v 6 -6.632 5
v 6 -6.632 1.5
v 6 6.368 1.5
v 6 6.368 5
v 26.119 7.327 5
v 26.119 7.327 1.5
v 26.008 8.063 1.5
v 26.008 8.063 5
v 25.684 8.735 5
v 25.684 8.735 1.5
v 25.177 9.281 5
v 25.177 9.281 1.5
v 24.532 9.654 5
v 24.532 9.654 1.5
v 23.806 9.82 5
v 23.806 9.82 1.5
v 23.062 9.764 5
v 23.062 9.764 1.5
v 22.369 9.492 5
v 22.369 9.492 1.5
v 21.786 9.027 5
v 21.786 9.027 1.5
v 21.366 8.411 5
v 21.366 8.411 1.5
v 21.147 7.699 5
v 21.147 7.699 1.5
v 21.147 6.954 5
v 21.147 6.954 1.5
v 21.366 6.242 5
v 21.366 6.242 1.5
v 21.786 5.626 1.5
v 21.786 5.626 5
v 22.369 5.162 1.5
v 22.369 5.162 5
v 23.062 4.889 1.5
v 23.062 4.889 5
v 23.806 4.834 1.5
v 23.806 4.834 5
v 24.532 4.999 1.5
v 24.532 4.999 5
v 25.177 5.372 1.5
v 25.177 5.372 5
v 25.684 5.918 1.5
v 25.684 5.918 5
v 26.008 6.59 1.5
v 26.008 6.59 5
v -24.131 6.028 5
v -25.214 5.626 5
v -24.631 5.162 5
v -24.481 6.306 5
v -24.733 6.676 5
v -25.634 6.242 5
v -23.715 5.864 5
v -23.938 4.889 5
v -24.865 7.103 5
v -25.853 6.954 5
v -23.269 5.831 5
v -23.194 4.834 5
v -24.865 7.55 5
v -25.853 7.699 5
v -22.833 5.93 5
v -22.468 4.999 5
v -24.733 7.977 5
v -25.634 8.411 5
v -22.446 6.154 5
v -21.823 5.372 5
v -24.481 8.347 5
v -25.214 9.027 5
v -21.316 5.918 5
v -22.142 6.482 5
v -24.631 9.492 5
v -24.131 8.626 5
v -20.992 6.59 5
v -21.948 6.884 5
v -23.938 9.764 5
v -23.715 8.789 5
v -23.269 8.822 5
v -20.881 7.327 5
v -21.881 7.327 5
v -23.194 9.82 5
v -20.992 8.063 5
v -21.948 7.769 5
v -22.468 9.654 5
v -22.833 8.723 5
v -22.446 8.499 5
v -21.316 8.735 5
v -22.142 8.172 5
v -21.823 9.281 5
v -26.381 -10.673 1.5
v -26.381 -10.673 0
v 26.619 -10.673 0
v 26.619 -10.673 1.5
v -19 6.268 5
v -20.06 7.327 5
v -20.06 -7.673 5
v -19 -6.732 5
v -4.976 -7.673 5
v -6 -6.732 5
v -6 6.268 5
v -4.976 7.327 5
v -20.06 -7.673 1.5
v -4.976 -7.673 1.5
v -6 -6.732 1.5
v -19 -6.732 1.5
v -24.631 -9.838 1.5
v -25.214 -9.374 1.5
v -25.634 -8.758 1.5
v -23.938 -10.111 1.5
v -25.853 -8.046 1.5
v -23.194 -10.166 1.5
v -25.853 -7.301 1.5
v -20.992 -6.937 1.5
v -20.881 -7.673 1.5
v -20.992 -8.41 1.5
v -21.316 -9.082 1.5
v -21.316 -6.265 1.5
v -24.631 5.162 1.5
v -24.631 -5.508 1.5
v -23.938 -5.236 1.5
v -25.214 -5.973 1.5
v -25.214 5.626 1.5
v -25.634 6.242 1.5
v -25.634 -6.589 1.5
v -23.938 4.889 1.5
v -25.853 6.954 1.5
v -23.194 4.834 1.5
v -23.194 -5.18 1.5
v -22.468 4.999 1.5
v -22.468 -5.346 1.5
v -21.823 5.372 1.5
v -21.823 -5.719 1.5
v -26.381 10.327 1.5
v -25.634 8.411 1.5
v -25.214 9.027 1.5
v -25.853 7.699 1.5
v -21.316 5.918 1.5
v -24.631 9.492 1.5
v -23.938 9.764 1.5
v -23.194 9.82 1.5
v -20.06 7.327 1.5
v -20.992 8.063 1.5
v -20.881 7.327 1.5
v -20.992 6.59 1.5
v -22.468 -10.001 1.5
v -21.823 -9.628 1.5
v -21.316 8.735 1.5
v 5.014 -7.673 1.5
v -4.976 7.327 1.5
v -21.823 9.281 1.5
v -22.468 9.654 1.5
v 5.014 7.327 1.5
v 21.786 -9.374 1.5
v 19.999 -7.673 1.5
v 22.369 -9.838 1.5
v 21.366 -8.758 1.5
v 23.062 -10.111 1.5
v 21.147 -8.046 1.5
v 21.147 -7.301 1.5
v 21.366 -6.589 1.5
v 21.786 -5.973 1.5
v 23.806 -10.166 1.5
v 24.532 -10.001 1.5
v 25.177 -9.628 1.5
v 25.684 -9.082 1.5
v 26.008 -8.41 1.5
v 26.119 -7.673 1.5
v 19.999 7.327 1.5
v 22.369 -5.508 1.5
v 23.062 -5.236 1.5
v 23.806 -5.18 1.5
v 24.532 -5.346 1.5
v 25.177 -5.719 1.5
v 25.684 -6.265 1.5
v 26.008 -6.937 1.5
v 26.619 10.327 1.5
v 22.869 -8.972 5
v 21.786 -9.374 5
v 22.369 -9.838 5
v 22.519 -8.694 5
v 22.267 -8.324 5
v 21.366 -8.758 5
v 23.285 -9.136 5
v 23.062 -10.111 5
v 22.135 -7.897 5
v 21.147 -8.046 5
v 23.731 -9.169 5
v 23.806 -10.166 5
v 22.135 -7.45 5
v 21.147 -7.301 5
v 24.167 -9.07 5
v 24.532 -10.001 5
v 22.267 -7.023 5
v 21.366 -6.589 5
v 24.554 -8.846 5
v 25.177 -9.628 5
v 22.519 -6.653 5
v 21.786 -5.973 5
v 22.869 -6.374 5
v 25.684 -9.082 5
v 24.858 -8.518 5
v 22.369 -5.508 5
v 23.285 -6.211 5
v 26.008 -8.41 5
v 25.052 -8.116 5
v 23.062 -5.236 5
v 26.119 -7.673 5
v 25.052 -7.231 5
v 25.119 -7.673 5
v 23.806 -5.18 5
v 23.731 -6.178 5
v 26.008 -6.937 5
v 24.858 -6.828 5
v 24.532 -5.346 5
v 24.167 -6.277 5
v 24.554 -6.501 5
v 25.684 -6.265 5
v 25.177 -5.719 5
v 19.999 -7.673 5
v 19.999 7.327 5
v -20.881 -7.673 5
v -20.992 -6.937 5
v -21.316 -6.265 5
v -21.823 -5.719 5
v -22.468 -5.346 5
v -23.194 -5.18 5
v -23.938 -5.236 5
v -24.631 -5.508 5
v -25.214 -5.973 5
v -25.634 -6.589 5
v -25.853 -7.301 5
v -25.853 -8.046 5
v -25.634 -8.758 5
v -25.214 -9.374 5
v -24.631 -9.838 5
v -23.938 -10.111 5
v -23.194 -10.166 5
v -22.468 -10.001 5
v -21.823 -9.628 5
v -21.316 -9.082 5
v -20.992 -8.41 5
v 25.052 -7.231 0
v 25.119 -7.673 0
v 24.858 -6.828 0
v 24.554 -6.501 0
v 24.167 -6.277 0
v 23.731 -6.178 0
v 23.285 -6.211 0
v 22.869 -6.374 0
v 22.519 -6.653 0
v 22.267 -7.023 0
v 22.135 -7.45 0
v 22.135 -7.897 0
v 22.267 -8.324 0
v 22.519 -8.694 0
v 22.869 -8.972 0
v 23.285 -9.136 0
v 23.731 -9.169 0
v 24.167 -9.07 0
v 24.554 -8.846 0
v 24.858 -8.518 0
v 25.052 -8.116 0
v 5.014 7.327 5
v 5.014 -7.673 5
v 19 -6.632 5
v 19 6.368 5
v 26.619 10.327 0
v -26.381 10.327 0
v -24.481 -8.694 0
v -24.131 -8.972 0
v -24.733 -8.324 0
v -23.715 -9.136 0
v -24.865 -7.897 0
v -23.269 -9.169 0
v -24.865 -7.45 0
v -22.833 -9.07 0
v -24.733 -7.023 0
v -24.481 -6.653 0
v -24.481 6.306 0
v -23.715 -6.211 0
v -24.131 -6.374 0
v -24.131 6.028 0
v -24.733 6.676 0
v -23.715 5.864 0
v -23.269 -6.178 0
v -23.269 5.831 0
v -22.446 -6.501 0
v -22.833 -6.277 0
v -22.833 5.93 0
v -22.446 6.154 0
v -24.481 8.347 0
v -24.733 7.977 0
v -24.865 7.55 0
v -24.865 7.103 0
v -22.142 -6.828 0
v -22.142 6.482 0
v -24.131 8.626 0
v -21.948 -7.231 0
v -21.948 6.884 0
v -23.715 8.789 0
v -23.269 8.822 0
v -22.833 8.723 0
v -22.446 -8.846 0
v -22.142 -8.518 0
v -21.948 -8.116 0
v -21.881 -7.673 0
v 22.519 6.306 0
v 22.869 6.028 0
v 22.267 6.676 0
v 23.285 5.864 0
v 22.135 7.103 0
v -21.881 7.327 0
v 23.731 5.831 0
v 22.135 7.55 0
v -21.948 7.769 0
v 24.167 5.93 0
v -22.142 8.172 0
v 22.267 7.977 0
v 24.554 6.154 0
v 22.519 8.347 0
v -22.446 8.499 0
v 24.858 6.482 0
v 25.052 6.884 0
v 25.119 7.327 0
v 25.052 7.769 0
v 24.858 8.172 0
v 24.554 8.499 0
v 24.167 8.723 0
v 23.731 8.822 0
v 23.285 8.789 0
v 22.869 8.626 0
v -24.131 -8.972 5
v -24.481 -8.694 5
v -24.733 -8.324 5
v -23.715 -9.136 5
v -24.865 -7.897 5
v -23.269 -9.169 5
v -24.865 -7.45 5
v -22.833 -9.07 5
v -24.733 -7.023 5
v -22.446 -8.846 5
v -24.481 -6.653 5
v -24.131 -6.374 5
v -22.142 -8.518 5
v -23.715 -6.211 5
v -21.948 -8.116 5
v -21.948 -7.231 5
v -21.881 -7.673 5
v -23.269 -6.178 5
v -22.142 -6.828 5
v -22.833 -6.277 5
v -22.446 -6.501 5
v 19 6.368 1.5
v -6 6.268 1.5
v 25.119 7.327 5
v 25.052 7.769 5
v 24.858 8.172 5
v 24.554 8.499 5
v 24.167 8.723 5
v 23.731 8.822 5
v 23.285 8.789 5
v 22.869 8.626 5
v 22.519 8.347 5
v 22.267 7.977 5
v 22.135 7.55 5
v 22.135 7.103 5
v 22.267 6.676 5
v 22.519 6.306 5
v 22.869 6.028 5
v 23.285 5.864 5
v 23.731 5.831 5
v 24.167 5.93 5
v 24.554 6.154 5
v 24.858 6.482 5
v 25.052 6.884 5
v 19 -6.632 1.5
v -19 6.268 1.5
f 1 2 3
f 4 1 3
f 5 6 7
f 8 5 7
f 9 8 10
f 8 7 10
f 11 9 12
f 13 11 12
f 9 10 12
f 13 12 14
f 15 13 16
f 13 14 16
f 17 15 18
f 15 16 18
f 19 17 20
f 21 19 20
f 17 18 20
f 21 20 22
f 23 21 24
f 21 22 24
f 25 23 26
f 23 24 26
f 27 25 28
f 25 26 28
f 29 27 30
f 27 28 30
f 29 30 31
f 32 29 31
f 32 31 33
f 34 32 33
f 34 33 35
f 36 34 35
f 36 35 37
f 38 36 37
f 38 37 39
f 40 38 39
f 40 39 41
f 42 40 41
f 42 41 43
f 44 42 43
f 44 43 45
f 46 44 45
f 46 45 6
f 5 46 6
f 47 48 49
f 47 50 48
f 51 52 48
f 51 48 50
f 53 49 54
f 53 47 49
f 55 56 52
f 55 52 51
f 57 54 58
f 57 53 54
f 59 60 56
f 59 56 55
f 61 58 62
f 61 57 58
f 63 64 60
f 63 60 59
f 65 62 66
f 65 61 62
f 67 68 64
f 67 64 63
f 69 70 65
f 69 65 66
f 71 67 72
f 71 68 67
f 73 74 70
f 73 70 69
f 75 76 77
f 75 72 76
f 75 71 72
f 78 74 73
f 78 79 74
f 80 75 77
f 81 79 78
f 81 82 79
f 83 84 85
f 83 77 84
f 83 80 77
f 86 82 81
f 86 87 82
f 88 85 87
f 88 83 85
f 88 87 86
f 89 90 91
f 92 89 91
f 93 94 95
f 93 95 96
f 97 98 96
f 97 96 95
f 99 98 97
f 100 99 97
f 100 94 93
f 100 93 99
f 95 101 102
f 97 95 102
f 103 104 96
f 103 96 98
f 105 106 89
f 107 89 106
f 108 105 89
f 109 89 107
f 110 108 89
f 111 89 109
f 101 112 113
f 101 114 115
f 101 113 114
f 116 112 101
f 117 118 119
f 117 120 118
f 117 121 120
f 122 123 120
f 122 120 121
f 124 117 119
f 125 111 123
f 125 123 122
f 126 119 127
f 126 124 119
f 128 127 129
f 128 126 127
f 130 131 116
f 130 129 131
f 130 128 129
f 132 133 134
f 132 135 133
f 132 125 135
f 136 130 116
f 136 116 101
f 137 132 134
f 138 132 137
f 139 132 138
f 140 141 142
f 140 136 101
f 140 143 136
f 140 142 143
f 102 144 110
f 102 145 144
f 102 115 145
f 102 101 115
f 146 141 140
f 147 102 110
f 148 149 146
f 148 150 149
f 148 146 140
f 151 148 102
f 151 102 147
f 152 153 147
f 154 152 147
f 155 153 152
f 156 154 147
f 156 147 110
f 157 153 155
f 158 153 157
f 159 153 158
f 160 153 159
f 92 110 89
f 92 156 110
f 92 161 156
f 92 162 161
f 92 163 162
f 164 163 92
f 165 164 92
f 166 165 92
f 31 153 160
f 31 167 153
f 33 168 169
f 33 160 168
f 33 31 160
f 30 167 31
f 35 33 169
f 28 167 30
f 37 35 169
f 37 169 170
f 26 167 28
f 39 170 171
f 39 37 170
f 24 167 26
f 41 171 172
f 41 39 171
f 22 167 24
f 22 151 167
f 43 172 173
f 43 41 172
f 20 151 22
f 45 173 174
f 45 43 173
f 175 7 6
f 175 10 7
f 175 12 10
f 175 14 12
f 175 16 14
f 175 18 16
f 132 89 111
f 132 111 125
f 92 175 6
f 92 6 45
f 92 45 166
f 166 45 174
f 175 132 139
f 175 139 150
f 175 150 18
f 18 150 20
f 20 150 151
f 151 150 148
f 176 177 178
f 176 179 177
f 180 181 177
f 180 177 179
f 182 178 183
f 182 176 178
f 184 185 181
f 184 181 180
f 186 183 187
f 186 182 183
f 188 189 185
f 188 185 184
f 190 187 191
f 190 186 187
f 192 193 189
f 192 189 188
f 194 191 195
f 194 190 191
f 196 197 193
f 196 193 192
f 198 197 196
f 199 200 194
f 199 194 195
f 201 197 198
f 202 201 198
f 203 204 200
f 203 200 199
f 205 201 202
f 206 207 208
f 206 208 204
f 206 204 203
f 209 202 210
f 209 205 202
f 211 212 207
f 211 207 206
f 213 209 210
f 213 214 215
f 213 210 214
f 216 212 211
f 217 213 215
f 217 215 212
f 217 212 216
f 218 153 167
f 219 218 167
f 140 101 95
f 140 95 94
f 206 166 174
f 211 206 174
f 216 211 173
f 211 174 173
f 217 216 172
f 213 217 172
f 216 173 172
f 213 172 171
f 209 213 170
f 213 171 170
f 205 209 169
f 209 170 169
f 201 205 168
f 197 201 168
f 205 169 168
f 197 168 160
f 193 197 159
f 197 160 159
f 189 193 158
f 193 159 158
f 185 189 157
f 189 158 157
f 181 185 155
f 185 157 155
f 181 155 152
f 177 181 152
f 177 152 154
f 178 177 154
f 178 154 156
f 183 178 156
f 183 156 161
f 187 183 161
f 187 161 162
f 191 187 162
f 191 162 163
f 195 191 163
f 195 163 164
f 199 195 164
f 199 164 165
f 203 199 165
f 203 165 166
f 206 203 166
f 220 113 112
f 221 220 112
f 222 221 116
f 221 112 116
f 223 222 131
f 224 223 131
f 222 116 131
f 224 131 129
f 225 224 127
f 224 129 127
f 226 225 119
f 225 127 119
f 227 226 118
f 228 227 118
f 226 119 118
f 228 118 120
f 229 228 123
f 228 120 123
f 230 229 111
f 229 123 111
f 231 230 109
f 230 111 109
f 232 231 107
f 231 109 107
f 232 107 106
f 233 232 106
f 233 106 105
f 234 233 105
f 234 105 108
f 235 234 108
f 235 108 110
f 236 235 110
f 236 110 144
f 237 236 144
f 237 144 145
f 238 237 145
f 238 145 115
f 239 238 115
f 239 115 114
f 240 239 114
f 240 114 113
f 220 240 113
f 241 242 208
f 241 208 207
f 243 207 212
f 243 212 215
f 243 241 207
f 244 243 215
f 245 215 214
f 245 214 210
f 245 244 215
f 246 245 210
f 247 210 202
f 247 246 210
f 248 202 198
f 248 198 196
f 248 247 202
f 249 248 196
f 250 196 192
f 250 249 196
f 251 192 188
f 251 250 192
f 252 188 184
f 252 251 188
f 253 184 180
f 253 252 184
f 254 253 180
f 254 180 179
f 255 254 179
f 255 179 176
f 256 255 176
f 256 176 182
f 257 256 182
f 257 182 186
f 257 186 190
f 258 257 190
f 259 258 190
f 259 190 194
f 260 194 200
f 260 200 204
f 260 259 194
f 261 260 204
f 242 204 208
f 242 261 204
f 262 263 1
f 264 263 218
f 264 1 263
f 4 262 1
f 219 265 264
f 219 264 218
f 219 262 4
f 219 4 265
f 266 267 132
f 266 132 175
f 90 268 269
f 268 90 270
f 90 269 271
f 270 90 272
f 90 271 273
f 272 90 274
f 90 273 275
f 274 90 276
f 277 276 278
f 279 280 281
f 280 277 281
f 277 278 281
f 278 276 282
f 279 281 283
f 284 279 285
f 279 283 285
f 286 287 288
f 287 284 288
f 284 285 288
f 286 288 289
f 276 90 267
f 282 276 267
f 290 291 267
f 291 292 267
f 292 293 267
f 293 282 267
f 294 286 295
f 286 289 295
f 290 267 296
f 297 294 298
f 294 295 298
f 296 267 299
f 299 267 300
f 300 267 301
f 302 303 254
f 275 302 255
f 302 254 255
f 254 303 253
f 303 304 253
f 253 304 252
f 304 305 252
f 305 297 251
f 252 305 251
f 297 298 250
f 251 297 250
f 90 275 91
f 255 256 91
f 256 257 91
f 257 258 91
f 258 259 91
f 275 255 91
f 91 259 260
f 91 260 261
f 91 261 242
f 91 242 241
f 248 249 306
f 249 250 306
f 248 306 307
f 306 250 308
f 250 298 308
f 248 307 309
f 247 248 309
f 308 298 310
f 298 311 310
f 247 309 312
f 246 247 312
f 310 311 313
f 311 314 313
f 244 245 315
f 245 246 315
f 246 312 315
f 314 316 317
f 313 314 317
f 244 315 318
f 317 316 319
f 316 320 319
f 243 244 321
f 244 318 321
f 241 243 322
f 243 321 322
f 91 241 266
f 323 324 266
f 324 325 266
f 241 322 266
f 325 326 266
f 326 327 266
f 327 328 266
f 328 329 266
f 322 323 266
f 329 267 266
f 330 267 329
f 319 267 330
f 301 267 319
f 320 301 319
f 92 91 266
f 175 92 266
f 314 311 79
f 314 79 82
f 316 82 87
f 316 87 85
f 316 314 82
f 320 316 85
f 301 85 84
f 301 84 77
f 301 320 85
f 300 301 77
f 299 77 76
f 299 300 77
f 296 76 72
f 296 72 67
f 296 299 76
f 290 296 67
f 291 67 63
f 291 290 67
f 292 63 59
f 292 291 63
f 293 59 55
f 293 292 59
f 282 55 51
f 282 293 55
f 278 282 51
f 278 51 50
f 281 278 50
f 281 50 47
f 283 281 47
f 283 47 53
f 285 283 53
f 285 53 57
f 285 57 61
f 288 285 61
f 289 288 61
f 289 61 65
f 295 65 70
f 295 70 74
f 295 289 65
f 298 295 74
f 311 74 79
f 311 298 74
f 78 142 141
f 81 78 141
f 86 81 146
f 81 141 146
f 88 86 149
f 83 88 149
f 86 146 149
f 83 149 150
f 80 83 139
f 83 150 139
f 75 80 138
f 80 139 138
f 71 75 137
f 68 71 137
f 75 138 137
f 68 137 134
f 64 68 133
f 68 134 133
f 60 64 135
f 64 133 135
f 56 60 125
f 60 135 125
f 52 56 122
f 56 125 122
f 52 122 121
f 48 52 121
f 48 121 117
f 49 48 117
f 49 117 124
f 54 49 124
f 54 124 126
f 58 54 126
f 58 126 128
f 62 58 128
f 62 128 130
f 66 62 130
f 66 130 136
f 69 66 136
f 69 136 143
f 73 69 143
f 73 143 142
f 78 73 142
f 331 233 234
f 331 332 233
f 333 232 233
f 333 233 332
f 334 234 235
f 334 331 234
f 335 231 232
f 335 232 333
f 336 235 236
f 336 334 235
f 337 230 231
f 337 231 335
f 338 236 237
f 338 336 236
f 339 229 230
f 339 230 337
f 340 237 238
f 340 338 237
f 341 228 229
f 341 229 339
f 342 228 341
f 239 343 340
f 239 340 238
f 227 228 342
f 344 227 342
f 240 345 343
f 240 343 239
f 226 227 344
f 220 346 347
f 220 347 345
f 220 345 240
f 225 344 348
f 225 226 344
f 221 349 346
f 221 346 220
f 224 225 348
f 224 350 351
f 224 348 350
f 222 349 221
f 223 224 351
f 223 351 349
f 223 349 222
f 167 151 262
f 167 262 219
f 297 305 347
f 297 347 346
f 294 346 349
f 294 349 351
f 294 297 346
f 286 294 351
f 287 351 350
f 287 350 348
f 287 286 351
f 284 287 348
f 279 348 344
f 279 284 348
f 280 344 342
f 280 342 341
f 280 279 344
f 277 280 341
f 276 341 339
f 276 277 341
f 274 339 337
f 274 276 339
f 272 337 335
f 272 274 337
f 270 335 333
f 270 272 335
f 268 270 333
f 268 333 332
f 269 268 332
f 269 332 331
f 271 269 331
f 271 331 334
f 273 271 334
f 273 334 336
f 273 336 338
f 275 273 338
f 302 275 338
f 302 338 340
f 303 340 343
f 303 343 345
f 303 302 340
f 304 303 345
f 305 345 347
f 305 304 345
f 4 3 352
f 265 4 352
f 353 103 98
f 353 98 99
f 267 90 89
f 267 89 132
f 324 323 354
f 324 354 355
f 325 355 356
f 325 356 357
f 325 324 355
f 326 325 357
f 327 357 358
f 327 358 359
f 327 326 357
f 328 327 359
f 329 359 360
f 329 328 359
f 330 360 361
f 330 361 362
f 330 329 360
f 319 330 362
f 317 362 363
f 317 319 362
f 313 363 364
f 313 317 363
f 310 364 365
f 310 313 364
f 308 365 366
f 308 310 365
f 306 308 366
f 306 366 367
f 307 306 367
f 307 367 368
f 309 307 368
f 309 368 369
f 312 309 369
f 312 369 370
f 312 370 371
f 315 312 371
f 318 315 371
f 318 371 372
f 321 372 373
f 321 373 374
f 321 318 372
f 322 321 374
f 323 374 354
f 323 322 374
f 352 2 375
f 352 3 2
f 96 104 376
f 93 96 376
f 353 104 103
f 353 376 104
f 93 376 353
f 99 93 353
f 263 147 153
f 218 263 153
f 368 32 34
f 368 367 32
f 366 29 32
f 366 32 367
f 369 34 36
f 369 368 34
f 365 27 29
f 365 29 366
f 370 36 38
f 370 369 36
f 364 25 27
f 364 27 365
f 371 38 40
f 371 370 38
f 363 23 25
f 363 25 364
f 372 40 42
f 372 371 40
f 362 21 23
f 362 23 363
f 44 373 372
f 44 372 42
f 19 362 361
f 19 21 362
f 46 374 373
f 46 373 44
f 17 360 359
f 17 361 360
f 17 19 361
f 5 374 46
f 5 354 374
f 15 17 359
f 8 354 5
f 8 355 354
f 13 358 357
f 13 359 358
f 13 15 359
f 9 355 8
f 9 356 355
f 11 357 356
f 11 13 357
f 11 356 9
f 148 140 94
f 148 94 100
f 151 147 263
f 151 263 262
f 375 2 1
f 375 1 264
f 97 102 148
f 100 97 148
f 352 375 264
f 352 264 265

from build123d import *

# Parameters (mm, degrees)
F0_W     = 53
F0_H     = 21
F0_R     = 2.5
F0_W_2   = 15.084836
F0_H_2   = 15
F0_W_3   = 14.984938
F0_W_4   = 13
F0_H_3   = 13
F1_DEPTH = 1.5
F2_DEPTH = 5
F0_R_2   = 1.5
F3_DEPTH = 5


with BuildPart() as f1:
    # F0 (on Top) → F1 (new body)
    with BuildSketch(Plane.XY):
        with Locations((0.118736, -0.1734)):
            Rectangle(F0_W, F0_H)
        with Locations((-23.381264, -7.6734)):
            Circle(F0_R, mode=Mode.SUBTRACT)
        with Locations((-12.518017, -0.1734)):
            Rectangle(F0_W_2, F0_H_2, mode=Mode.SUBTRACT)
        with Locations((23.618736, -7.6734)):
            Circle(F0_R, mode=Mode.SUBTRACT)
        with Locations((12.506826, -0.1734)):
            Rectangle(F0_W_3, F0_H_2, mode=Mode.SUBTRACT)
        with Locations((-23.381264, 7.3266)):
            Circle(F0_R, mode=Mode.SUBTRACT)
        with Locations((23.618736, 7.3266)):
            Circle(F0_R, mode=Mode.SUBTRACT)
        with Locations((-12.518017, -0.1734)):
            Rectangle(F0_W_2, F0_H_2)
        with Locations((-12.5, -0.232354)):
            Rectangle(F0_W_4, F0_H_3, mode=Mode.SUBTRACT)
        with Locations((-12.5, -0.232354)):
            Rectangle(F0_W_4, F0_H_3)
        with Locations((12.506826, -0.1734)):
            Rectangle(F0_W_3, F0_H_2)
        with Locations((12.5, -0.132455)):
            Rectangle(F0_W_4, F0_H_3, mode=Mode.SUBTRACT)
        with Locations((12.5, -0.132455)):
            Rectangle(F0_W_4, F0_H_3)
    extrude(amount=F1_DEPTH)

    # F0 (on Top) → F2 (join)
    with BuildSketch(Plane.XY):
        with Locations((-12.518017, -0.1734)):
            Rectangle(F0_W_2, F0_H_2)
        with Locations((-12.5, -0.232354)):
            Rectangle(F0_W_4, F0_H_3, mode=Mode.SUBTRACT)
        with Locations((12.506826, -0.1734)):
            Rectangle(F0_W_3, F0_H_2)
        with Locations((12.5, -0.132455)):
            Rectangle(F0_W_4, F0_H_3, mode=Mode.SUBTRACT)
    extrude(amount=F2_DEPTH)

    # F0 (on Top) → F3 (join)
    with BuildSketch(Plane.XY):
        with Locations((-23.381264, 7.3266)):
            Circle(F0_R)
        with Locations((-23.381264, 7.3266)):
            Circle(F0_R_2, mode=Mode.SUBTRACT)
        with Locations((-23.381264, -7.6734)):
            Circle(F0_R)
        with Locations((-23.381264, -7.6734)):
            Circle(F0_R_2, mode=Mode.SUBTRACT)
        with Locations((23.618736, -7.6734)):
            Circle(F0_R)
        with Locations((23.618736, -7.6734)):
            Circle(F0_R_2, mode=Mode.SUBTRACT)
        with Locations((23.618736, 7.3266)):
            Circle(F0_R)
        with Locations((23.618736, 7.3266)):
            Circle(F0_R_2, mode=Mode.SUBTRACT)
    extrude(amount=F3_DEPTH)


solid = f1.part
